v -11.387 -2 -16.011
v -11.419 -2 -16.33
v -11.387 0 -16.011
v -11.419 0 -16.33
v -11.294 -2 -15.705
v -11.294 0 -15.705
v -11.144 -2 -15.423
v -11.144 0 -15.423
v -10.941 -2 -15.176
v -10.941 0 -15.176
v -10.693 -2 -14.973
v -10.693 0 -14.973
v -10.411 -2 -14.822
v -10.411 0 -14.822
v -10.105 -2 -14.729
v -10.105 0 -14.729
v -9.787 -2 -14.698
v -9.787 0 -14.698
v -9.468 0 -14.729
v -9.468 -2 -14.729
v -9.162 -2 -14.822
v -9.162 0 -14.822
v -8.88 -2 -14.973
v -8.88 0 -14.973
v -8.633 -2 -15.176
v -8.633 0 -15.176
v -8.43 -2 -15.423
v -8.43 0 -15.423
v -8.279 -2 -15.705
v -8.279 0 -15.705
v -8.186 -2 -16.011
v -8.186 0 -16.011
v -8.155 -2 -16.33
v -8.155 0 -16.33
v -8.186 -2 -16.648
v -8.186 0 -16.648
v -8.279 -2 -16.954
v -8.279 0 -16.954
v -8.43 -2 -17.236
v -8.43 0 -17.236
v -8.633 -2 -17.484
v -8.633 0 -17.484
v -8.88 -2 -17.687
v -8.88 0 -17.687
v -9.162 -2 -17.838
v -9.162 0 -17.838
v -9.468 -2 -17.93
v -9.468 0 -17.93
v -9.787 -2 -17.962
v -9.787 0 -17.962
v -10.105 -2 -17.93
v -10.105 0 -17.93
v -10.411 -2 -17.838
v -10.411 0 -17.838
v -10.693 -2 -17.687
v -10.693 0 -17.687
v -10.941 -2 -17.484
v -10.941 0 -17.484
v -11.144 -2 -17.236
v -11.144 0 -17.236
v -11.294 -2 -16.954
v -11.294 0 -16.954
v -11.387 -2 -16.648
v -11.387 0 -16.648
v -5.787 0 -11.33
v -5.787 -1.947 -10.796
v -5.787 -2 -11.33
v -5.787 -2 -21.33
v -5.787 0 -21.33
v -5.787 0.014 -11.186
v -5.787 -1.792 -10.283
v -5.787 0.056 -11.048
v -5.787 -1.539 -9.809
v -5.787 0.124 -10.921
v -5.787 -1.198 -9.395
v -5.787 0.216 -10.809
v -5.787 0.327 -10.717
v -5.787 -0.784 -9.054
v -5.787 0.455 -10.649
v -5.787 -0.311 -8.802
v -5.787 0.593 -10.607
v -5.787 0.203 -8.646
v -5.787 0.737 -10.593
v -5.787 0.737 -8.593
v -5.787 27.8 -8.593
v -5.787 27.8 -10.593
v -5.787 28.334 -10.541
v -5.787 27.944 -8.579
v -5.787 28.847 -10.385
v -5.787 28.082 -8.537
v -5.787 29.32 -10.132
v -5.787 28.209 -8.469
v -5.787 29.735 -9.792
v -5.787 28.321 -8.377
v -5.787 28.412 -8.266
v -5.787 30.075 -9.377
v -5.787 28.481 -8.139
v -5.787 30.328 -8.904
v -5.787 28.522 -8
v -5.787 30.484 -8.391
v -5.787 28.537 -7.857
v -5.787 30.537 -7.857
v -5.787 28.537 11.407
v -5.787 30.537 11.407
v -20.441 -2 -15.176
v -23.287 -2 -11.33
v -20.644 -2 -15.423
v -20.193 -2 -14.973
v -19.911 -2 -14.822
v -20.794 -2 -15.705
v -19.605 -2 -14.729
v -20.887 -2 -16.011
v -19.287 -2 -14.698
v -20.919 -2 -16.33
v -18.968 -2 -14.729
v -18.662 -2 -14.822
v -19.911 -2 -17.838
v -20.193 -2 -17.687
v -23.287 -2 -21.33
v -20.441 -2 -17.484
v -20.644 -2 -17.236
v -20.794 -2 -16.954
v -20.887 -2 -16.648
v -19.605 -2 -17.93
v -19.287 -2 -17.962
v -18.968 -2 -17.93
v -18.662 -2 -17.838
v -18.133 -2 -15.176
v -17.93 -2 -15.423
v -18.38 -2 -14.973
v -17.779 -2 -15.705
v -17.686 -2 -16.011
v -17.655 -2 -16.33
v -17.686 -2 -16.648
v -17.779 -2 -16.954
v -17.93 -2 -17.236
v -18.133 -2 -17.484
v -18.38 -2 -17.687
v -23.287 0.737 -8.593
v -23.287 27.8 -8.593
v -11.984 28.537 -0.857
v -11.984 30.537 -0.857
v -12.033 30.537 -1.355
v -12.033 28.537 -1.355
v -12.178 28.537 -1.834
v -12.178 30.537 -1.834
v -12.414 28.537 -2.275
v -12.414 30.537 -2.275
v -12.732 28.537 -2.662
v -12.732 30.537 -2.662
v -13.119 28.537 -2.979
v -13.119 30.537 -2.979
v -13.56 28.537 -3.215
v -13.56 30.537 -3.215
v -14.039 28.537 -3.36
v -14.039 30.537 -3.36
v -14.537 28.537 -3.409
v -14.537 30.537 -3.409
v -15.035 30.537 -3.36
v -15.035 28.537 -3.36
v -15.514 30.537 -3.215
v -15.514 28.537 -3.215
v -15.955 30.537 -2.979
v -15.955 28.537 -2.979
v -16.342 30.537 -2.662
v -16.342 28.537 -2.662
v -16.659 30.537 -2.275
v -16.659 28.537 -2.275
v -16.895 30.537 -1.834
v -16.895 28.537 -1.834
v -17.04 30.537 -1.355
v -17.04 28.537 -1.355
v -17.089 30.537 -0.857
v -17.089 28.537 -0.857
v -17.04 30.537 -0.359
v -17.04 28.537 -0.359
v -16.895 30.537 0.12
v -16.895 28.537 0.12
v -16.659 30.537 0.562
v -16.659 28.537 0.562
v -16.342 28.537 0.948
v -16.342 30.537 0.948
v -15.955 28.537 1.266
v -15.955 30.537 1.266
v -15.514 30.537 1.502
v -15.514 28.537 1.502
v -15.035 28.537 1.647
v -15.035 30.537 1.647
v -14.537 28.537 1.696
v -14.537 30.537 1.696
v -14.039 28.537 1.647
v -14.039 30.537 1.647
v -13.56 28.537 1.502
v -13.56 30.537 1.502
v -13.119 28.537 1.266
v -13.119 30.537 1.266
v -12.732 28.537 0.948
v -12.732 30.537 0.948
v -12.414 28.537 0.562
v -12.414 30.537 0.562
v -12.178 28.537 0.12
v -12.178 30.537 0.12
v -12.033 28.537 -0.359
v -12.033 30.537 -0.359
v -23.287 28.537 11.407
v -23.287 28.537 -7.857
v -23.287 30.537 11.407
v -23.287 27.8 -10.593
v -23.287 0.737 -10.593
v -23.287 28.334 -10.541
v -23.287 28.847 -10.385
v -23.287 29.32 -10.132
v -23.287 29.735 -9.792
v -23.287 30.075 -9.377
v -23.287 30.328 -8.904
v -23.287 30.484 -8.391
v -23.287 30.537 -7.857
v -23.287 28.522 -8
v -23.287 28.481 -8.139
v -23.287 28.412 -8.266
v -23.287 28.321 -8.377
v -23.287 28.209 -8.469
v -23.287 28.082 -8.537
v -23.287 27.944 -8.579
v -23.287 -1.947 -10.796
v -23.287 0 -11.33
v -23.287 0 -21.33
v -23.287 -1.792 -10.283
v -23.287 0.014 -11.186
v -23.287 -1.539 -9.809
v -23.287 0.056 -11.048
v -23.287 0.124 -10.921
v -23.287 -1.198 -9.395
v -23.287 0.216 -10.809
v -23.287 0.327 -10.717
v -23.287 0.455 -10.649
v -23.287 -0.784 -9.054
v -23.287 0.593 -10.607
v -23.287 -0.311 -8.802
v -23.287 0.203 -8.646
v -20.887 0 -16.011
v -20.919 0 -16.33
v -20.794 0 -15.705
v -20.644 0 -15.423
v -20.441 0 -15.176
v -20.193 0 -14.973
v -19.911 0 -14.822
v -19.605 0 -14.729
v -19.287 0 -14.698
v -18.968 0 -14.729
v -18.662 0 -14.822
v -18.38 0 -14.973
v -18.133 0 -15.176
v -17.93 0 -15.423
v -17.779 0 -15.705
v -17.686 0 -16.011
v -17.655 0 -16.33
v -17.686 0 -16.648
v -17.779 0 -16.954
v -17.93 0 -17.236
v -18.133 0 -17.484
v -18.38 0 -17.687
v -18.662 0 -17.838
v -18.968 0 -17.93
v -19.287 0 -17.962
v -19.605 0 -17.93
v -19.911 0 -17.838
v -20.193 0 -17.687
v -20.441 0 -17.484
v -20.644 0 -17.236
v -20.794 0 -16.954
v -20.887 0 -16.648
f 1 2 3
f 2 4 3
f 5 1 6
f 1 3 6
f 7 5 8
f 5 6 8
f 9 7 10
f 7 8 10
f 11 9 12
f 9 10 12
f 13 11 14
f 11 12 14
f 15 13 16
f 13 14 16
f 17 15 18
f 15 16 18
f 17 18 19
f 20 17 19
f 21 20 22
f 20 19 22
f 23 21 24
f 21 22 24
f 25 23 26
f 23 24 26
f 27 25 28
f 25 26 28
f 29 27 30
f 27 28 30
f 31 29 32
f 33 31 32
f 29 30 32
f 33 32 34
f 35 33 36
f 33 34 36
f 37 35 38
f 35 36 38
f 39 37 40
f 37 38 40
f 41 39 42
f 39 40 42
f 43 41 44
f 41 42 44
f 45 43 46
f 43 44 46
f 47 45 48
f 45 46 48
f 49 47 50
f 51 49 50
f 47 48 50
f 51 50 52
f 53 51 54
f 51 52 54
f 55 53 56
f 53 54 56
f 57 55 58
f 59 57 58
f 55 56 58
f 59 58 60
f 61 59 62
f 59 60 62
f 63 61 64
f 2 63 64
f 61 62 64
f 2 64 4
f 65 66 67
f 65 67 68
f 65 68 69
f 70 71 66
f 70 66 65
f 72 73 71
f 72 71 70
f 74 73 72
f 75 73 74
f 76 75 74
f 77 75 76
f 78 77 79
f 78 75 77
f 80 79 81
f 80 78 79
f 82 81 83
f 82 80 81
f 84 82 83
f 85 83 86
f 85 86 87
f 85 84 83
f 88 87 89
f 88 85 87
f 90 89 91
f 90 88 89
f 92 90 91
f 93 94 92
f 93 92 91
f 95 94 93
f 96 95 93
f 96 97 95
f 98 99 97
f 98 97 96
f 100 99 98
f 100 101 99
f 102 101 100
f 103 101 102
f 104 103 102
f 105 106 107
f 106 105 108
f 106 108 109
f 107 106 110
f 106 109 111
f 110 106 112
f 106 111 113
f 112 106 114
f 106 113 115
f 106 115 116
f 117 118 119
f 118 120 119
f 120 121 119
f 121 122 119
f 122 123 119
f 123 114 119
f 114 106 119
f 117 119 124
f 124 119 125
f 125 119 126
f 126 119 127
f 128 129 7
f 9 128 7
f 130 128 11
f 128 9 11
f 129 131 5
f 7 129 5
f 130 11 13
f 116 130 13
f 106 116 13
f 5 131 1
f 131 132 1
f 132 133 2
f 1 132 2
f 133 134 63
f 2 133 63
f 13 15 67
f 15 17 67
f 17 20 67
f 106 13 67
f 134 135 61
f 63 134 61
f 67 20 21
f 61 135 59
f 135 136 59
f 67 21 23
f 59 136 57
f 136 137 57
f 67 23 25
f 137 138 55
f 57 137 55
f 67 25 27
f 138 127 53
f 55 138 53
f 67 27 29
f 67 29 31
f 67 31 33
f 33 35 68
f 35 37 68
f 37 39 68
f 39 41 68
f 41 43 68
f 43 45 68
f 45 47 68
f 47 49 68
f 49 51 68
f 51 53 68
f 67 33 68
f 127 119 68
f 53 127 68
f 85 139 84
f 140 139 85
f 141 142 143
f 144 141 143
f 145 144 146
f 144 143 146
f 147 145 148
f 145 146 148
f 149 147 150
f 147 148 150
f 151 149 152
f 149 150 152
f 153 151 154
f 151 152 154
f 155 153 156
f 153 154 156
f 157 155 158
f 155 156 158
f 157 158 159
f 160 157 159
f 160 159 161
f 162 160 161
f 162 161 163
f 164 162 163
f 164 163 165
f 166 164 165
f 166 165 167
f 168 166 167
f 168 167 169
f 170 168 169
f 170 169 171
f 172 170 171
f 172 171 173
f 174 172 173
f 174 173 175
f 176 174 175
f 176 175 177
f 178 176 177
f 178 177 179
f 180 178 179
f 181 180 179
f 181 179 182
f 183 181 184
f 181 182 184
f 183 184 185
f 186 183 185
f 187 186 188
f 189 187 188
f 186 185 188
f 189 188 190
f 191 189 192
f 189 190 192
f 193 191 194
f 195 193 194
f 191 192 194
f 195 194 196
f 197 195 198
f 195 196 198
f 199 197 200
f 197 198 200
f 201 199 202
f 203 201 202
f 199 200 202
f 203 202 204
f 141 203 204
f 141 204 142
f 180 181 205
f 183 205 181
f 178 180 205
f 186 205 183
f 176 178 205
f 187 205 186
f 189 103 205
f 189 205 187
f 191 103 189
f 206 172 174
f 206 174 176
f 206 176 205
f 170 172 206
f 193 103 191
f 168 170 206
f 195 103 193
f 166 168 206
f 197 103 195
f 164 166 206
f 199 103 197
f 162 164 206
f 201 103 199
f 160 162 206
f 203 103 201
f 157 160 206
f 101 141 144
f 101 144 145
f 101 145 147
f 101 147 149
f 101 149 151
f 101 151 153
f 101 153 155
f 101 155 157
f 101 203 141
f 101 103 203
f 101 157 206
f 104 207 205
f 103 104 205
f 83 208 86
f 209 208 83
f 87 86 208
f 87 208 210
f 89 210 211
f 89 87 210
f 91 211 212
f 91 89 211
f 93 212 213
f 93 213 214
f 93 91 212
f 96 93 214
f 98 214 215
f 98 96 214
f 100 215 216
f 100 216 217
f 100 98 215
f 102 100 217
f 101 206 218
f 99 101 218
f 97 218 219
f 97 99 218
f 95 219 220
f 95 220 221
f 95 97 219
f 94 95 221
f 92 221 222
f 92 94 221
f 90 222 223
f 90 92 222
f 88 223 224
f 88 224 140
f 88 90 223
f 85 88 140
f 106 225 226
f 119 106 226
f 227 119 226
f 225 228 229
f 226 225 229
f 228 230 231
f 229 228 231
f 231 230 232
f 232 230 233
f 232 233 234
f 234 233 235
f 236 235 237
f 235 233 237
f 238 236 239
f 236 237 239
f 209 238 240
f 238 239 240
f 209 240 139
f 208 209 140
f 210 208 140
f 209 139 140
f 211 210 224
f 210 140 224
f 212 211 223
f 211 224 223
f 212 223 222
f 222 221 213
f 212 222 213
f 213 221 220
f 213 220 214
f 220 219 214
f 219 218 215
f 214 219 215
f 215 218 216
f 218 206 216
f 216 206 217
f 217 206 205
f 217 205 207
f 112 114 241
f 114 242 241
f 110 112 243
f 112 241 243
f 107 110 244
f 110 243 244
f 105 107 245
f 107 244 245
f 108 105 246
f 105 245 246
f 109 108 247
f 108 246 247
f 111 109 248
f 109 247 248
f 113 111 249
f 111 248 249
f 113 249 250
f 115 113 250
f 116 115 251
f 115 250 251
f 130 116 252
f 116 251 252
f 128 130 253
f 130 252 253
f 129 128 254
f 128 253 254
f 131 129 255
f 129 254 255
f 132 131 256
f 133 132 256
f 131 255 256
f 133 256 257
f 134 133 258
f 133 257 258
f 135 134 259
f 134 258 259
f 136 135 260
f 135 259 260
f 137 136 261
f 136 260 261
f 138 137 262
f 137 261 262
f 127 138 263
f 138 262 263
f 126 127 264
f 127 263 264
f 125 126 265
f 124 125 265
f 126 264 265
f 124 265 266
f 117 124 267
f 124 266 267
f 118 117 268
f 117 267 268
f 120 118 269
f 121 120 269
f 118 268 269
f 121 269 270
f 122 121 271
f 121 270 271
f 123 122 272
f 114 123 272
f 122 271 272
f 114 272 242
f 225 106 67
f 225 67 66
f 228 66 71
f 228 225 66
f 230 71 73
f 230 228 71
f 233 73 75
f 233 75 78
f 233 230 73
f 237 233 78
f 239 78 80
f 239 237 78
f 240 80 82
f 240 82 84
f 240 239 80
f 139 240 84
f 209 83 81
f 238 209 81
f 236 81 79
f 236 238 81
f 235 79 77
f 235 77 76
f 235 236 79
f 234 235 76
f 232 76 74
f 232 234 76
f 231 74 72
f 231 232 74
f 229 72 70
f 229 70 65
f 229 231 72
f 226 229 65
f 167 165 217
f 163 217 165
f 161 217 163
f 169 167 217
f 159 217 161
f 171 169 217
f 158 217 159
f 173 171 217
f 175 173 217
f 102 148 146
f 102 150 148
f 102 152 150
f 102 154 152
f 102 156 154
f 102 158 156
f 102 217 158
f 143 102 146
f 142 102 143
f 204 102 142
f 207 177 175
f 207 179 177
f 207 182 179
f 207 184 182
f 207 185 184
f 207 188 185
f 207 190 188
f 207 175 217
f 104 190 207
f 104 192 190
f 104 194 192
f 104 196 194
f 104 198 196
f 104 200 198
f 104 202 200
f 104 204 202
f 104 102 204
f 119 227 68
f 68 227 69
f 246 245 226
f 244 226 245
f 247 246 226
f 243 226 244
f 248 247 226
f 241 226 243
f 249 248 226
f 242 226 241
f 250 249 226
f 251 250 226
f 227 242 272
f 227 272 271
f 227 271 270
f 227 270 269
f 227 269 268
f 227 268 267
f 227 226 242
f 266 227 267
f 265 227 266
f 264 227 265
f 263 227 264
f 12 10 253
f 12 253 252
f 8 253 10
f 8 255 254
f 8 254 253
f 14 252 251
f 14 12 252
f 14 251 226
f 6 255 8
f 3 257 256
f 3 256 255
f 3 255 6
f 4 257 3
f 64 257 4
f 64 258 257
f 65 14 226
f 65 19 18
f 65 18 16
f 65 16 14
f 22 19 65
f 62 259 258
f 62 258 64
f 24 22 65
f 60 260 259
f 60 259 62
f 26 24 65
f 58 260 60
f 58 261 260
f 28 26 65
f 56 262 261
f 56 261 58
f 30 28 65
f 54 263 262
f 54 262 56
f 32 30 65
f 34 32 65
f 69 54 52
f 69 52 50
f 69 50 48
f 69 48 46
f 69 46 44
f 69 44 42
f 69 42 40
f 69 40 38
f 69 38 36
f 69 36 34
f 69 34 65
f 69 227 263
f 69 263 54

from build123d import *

# Parameters (mm, degrees)
SKETCH1_W                  = 17.5
SKETCH1_H                  = 10
BASE_FLANGE1_DEPTH         = 2
F_4_CLEARANCE_HOLE1_D      = 3.2639
F_4_CLEARANCE_HOLE1_DEPTH  = 2
F_4_CLEARANCE_HOLE1_TIP    = 0.980574487
EDGE_FLANGE2_DEPTH         = 17.5
EDGE_FLANGE3_DEPTH         = 17.5
F_10_CLEARANCE_HOLE1_D     = 5.1054
F_10_CLEARANCE_HOLE1_DEPTH = 7.6
F_10_CLEARANCE_HOLE1_TIP   = 1.533816902


# Sheet-metal steps are written as plain solids
with BuildPart() as part:
    # Sketch1 → Base-Flange1 (new body)
    with BuildSketch(Plane(origin=(0, 0, 0), x_dir=(1, 0, 0), z_dir=(0, 1, 0))):
        with Locations((-14.536713287, 16.32983683)):
            Rectangle(SKETCH1_W, SKETCH1_H)
    extrude(amount=-BASE_FLANGE1_DEPTH)

    # #4 Clearance Hole1
    with Locations(Plane.XZ.offset(2)):
        with Locations((-9.786713287, -16.32983683), (-19.286713287, -16.32983683)):
            Hole(F_4_CLEARANCE_HOLE1_D / 2, depth=F_4_CLEARANCE_HOLE1_DEPTH)
            with Locations((0, 0, -(F_4_CLEARANCE_HOLE1_DEPTH + F_4_CLEARANCE_HOLE1_TIP / 2))):  # 118° drill point
                Cone(0, F_4_CLEARANCE_HOLE1_D / 2, F_4_CLEARANCE_HOLE1_TIP, mode=Mode.SUBTRACT)

    # Edge-Flange2 section (across the edge) → Edge-Flange2 (add)
    with BuildSketch(Plane(origin=(-23.286713287, 0, -10.59323683), x_dir=(0, 0, -1), z_dir=(1, 0, 0))):
        with BuildLine():
            Line((-2, 0.7366), (-2, 27.8))
            Line((-2, 27.8), (0, 27.8))
            Line((0, 27.8), (0, 0.7366))
            ThreePointArc((0, 0.7366), (0.215745145, 0.215745145), (0.7366, 0))
            Line((0.7366, 0), (0.7366, -2))
            ThreePointArc((0.7366, -2), (-1.198468417, -1.198468417), (-2, 0.7366))
        make_face()
    extrude(amount=EDGE_FLANGE2_DEPTH)

    # Edge-Flange3 section (across the edge) → Edge-Flange3 (add)
    with BuildSketch(Plane(origin=(-5.786713287, 28.5366, -8.59323683), x_dir=(0, -1, 0), z_dir=(-1, 0, 0))):
        with BuildLine():
            Line((-2, 0.7366), (-2, 20))
            Line((-2, 20), (0, 20))
            Line((0, 20), (0, 0.7366))
            ThreePointArc((0, 0.7366), (0.215745145, 0.215745145), (0.7366, 0))
            Line((0.7366, 0), (0.7366, -2))
            ThreePointArc((0.7366, -2), (-1.198468417, -1.198468417), (-2, 0.7366))
        make_face()
    extrude(amount=EDGE_FLANGE3_DEPTH)

    # #10 Clearance Hole1
    with Locations(Plane(origin=(0, 28.5366, 0), x_dir=(-1, 0, 0), z_dir=(0, -1, 0))):
        with Locations((14.536713287, 0.85663683)):
            Hole(F_10_CLEARANCE_HOLE1_D / 2, depth=F_10_CLEARANCE_HOLE1_DEPTH)
            with Locations((0, 0, -(F_10_CLEARANCE_HOLE1_DEPTH + F_10_CLEARANCE_HOLE1_TIP / 2))):  # 118° drill point
                Cone(0, F_10_CLEARANCE_HOLE1_D / 2, F_10_CLEARANCE_HOLE1_TIP, mode=Mode.SUBTRACT)


solid = part.part
